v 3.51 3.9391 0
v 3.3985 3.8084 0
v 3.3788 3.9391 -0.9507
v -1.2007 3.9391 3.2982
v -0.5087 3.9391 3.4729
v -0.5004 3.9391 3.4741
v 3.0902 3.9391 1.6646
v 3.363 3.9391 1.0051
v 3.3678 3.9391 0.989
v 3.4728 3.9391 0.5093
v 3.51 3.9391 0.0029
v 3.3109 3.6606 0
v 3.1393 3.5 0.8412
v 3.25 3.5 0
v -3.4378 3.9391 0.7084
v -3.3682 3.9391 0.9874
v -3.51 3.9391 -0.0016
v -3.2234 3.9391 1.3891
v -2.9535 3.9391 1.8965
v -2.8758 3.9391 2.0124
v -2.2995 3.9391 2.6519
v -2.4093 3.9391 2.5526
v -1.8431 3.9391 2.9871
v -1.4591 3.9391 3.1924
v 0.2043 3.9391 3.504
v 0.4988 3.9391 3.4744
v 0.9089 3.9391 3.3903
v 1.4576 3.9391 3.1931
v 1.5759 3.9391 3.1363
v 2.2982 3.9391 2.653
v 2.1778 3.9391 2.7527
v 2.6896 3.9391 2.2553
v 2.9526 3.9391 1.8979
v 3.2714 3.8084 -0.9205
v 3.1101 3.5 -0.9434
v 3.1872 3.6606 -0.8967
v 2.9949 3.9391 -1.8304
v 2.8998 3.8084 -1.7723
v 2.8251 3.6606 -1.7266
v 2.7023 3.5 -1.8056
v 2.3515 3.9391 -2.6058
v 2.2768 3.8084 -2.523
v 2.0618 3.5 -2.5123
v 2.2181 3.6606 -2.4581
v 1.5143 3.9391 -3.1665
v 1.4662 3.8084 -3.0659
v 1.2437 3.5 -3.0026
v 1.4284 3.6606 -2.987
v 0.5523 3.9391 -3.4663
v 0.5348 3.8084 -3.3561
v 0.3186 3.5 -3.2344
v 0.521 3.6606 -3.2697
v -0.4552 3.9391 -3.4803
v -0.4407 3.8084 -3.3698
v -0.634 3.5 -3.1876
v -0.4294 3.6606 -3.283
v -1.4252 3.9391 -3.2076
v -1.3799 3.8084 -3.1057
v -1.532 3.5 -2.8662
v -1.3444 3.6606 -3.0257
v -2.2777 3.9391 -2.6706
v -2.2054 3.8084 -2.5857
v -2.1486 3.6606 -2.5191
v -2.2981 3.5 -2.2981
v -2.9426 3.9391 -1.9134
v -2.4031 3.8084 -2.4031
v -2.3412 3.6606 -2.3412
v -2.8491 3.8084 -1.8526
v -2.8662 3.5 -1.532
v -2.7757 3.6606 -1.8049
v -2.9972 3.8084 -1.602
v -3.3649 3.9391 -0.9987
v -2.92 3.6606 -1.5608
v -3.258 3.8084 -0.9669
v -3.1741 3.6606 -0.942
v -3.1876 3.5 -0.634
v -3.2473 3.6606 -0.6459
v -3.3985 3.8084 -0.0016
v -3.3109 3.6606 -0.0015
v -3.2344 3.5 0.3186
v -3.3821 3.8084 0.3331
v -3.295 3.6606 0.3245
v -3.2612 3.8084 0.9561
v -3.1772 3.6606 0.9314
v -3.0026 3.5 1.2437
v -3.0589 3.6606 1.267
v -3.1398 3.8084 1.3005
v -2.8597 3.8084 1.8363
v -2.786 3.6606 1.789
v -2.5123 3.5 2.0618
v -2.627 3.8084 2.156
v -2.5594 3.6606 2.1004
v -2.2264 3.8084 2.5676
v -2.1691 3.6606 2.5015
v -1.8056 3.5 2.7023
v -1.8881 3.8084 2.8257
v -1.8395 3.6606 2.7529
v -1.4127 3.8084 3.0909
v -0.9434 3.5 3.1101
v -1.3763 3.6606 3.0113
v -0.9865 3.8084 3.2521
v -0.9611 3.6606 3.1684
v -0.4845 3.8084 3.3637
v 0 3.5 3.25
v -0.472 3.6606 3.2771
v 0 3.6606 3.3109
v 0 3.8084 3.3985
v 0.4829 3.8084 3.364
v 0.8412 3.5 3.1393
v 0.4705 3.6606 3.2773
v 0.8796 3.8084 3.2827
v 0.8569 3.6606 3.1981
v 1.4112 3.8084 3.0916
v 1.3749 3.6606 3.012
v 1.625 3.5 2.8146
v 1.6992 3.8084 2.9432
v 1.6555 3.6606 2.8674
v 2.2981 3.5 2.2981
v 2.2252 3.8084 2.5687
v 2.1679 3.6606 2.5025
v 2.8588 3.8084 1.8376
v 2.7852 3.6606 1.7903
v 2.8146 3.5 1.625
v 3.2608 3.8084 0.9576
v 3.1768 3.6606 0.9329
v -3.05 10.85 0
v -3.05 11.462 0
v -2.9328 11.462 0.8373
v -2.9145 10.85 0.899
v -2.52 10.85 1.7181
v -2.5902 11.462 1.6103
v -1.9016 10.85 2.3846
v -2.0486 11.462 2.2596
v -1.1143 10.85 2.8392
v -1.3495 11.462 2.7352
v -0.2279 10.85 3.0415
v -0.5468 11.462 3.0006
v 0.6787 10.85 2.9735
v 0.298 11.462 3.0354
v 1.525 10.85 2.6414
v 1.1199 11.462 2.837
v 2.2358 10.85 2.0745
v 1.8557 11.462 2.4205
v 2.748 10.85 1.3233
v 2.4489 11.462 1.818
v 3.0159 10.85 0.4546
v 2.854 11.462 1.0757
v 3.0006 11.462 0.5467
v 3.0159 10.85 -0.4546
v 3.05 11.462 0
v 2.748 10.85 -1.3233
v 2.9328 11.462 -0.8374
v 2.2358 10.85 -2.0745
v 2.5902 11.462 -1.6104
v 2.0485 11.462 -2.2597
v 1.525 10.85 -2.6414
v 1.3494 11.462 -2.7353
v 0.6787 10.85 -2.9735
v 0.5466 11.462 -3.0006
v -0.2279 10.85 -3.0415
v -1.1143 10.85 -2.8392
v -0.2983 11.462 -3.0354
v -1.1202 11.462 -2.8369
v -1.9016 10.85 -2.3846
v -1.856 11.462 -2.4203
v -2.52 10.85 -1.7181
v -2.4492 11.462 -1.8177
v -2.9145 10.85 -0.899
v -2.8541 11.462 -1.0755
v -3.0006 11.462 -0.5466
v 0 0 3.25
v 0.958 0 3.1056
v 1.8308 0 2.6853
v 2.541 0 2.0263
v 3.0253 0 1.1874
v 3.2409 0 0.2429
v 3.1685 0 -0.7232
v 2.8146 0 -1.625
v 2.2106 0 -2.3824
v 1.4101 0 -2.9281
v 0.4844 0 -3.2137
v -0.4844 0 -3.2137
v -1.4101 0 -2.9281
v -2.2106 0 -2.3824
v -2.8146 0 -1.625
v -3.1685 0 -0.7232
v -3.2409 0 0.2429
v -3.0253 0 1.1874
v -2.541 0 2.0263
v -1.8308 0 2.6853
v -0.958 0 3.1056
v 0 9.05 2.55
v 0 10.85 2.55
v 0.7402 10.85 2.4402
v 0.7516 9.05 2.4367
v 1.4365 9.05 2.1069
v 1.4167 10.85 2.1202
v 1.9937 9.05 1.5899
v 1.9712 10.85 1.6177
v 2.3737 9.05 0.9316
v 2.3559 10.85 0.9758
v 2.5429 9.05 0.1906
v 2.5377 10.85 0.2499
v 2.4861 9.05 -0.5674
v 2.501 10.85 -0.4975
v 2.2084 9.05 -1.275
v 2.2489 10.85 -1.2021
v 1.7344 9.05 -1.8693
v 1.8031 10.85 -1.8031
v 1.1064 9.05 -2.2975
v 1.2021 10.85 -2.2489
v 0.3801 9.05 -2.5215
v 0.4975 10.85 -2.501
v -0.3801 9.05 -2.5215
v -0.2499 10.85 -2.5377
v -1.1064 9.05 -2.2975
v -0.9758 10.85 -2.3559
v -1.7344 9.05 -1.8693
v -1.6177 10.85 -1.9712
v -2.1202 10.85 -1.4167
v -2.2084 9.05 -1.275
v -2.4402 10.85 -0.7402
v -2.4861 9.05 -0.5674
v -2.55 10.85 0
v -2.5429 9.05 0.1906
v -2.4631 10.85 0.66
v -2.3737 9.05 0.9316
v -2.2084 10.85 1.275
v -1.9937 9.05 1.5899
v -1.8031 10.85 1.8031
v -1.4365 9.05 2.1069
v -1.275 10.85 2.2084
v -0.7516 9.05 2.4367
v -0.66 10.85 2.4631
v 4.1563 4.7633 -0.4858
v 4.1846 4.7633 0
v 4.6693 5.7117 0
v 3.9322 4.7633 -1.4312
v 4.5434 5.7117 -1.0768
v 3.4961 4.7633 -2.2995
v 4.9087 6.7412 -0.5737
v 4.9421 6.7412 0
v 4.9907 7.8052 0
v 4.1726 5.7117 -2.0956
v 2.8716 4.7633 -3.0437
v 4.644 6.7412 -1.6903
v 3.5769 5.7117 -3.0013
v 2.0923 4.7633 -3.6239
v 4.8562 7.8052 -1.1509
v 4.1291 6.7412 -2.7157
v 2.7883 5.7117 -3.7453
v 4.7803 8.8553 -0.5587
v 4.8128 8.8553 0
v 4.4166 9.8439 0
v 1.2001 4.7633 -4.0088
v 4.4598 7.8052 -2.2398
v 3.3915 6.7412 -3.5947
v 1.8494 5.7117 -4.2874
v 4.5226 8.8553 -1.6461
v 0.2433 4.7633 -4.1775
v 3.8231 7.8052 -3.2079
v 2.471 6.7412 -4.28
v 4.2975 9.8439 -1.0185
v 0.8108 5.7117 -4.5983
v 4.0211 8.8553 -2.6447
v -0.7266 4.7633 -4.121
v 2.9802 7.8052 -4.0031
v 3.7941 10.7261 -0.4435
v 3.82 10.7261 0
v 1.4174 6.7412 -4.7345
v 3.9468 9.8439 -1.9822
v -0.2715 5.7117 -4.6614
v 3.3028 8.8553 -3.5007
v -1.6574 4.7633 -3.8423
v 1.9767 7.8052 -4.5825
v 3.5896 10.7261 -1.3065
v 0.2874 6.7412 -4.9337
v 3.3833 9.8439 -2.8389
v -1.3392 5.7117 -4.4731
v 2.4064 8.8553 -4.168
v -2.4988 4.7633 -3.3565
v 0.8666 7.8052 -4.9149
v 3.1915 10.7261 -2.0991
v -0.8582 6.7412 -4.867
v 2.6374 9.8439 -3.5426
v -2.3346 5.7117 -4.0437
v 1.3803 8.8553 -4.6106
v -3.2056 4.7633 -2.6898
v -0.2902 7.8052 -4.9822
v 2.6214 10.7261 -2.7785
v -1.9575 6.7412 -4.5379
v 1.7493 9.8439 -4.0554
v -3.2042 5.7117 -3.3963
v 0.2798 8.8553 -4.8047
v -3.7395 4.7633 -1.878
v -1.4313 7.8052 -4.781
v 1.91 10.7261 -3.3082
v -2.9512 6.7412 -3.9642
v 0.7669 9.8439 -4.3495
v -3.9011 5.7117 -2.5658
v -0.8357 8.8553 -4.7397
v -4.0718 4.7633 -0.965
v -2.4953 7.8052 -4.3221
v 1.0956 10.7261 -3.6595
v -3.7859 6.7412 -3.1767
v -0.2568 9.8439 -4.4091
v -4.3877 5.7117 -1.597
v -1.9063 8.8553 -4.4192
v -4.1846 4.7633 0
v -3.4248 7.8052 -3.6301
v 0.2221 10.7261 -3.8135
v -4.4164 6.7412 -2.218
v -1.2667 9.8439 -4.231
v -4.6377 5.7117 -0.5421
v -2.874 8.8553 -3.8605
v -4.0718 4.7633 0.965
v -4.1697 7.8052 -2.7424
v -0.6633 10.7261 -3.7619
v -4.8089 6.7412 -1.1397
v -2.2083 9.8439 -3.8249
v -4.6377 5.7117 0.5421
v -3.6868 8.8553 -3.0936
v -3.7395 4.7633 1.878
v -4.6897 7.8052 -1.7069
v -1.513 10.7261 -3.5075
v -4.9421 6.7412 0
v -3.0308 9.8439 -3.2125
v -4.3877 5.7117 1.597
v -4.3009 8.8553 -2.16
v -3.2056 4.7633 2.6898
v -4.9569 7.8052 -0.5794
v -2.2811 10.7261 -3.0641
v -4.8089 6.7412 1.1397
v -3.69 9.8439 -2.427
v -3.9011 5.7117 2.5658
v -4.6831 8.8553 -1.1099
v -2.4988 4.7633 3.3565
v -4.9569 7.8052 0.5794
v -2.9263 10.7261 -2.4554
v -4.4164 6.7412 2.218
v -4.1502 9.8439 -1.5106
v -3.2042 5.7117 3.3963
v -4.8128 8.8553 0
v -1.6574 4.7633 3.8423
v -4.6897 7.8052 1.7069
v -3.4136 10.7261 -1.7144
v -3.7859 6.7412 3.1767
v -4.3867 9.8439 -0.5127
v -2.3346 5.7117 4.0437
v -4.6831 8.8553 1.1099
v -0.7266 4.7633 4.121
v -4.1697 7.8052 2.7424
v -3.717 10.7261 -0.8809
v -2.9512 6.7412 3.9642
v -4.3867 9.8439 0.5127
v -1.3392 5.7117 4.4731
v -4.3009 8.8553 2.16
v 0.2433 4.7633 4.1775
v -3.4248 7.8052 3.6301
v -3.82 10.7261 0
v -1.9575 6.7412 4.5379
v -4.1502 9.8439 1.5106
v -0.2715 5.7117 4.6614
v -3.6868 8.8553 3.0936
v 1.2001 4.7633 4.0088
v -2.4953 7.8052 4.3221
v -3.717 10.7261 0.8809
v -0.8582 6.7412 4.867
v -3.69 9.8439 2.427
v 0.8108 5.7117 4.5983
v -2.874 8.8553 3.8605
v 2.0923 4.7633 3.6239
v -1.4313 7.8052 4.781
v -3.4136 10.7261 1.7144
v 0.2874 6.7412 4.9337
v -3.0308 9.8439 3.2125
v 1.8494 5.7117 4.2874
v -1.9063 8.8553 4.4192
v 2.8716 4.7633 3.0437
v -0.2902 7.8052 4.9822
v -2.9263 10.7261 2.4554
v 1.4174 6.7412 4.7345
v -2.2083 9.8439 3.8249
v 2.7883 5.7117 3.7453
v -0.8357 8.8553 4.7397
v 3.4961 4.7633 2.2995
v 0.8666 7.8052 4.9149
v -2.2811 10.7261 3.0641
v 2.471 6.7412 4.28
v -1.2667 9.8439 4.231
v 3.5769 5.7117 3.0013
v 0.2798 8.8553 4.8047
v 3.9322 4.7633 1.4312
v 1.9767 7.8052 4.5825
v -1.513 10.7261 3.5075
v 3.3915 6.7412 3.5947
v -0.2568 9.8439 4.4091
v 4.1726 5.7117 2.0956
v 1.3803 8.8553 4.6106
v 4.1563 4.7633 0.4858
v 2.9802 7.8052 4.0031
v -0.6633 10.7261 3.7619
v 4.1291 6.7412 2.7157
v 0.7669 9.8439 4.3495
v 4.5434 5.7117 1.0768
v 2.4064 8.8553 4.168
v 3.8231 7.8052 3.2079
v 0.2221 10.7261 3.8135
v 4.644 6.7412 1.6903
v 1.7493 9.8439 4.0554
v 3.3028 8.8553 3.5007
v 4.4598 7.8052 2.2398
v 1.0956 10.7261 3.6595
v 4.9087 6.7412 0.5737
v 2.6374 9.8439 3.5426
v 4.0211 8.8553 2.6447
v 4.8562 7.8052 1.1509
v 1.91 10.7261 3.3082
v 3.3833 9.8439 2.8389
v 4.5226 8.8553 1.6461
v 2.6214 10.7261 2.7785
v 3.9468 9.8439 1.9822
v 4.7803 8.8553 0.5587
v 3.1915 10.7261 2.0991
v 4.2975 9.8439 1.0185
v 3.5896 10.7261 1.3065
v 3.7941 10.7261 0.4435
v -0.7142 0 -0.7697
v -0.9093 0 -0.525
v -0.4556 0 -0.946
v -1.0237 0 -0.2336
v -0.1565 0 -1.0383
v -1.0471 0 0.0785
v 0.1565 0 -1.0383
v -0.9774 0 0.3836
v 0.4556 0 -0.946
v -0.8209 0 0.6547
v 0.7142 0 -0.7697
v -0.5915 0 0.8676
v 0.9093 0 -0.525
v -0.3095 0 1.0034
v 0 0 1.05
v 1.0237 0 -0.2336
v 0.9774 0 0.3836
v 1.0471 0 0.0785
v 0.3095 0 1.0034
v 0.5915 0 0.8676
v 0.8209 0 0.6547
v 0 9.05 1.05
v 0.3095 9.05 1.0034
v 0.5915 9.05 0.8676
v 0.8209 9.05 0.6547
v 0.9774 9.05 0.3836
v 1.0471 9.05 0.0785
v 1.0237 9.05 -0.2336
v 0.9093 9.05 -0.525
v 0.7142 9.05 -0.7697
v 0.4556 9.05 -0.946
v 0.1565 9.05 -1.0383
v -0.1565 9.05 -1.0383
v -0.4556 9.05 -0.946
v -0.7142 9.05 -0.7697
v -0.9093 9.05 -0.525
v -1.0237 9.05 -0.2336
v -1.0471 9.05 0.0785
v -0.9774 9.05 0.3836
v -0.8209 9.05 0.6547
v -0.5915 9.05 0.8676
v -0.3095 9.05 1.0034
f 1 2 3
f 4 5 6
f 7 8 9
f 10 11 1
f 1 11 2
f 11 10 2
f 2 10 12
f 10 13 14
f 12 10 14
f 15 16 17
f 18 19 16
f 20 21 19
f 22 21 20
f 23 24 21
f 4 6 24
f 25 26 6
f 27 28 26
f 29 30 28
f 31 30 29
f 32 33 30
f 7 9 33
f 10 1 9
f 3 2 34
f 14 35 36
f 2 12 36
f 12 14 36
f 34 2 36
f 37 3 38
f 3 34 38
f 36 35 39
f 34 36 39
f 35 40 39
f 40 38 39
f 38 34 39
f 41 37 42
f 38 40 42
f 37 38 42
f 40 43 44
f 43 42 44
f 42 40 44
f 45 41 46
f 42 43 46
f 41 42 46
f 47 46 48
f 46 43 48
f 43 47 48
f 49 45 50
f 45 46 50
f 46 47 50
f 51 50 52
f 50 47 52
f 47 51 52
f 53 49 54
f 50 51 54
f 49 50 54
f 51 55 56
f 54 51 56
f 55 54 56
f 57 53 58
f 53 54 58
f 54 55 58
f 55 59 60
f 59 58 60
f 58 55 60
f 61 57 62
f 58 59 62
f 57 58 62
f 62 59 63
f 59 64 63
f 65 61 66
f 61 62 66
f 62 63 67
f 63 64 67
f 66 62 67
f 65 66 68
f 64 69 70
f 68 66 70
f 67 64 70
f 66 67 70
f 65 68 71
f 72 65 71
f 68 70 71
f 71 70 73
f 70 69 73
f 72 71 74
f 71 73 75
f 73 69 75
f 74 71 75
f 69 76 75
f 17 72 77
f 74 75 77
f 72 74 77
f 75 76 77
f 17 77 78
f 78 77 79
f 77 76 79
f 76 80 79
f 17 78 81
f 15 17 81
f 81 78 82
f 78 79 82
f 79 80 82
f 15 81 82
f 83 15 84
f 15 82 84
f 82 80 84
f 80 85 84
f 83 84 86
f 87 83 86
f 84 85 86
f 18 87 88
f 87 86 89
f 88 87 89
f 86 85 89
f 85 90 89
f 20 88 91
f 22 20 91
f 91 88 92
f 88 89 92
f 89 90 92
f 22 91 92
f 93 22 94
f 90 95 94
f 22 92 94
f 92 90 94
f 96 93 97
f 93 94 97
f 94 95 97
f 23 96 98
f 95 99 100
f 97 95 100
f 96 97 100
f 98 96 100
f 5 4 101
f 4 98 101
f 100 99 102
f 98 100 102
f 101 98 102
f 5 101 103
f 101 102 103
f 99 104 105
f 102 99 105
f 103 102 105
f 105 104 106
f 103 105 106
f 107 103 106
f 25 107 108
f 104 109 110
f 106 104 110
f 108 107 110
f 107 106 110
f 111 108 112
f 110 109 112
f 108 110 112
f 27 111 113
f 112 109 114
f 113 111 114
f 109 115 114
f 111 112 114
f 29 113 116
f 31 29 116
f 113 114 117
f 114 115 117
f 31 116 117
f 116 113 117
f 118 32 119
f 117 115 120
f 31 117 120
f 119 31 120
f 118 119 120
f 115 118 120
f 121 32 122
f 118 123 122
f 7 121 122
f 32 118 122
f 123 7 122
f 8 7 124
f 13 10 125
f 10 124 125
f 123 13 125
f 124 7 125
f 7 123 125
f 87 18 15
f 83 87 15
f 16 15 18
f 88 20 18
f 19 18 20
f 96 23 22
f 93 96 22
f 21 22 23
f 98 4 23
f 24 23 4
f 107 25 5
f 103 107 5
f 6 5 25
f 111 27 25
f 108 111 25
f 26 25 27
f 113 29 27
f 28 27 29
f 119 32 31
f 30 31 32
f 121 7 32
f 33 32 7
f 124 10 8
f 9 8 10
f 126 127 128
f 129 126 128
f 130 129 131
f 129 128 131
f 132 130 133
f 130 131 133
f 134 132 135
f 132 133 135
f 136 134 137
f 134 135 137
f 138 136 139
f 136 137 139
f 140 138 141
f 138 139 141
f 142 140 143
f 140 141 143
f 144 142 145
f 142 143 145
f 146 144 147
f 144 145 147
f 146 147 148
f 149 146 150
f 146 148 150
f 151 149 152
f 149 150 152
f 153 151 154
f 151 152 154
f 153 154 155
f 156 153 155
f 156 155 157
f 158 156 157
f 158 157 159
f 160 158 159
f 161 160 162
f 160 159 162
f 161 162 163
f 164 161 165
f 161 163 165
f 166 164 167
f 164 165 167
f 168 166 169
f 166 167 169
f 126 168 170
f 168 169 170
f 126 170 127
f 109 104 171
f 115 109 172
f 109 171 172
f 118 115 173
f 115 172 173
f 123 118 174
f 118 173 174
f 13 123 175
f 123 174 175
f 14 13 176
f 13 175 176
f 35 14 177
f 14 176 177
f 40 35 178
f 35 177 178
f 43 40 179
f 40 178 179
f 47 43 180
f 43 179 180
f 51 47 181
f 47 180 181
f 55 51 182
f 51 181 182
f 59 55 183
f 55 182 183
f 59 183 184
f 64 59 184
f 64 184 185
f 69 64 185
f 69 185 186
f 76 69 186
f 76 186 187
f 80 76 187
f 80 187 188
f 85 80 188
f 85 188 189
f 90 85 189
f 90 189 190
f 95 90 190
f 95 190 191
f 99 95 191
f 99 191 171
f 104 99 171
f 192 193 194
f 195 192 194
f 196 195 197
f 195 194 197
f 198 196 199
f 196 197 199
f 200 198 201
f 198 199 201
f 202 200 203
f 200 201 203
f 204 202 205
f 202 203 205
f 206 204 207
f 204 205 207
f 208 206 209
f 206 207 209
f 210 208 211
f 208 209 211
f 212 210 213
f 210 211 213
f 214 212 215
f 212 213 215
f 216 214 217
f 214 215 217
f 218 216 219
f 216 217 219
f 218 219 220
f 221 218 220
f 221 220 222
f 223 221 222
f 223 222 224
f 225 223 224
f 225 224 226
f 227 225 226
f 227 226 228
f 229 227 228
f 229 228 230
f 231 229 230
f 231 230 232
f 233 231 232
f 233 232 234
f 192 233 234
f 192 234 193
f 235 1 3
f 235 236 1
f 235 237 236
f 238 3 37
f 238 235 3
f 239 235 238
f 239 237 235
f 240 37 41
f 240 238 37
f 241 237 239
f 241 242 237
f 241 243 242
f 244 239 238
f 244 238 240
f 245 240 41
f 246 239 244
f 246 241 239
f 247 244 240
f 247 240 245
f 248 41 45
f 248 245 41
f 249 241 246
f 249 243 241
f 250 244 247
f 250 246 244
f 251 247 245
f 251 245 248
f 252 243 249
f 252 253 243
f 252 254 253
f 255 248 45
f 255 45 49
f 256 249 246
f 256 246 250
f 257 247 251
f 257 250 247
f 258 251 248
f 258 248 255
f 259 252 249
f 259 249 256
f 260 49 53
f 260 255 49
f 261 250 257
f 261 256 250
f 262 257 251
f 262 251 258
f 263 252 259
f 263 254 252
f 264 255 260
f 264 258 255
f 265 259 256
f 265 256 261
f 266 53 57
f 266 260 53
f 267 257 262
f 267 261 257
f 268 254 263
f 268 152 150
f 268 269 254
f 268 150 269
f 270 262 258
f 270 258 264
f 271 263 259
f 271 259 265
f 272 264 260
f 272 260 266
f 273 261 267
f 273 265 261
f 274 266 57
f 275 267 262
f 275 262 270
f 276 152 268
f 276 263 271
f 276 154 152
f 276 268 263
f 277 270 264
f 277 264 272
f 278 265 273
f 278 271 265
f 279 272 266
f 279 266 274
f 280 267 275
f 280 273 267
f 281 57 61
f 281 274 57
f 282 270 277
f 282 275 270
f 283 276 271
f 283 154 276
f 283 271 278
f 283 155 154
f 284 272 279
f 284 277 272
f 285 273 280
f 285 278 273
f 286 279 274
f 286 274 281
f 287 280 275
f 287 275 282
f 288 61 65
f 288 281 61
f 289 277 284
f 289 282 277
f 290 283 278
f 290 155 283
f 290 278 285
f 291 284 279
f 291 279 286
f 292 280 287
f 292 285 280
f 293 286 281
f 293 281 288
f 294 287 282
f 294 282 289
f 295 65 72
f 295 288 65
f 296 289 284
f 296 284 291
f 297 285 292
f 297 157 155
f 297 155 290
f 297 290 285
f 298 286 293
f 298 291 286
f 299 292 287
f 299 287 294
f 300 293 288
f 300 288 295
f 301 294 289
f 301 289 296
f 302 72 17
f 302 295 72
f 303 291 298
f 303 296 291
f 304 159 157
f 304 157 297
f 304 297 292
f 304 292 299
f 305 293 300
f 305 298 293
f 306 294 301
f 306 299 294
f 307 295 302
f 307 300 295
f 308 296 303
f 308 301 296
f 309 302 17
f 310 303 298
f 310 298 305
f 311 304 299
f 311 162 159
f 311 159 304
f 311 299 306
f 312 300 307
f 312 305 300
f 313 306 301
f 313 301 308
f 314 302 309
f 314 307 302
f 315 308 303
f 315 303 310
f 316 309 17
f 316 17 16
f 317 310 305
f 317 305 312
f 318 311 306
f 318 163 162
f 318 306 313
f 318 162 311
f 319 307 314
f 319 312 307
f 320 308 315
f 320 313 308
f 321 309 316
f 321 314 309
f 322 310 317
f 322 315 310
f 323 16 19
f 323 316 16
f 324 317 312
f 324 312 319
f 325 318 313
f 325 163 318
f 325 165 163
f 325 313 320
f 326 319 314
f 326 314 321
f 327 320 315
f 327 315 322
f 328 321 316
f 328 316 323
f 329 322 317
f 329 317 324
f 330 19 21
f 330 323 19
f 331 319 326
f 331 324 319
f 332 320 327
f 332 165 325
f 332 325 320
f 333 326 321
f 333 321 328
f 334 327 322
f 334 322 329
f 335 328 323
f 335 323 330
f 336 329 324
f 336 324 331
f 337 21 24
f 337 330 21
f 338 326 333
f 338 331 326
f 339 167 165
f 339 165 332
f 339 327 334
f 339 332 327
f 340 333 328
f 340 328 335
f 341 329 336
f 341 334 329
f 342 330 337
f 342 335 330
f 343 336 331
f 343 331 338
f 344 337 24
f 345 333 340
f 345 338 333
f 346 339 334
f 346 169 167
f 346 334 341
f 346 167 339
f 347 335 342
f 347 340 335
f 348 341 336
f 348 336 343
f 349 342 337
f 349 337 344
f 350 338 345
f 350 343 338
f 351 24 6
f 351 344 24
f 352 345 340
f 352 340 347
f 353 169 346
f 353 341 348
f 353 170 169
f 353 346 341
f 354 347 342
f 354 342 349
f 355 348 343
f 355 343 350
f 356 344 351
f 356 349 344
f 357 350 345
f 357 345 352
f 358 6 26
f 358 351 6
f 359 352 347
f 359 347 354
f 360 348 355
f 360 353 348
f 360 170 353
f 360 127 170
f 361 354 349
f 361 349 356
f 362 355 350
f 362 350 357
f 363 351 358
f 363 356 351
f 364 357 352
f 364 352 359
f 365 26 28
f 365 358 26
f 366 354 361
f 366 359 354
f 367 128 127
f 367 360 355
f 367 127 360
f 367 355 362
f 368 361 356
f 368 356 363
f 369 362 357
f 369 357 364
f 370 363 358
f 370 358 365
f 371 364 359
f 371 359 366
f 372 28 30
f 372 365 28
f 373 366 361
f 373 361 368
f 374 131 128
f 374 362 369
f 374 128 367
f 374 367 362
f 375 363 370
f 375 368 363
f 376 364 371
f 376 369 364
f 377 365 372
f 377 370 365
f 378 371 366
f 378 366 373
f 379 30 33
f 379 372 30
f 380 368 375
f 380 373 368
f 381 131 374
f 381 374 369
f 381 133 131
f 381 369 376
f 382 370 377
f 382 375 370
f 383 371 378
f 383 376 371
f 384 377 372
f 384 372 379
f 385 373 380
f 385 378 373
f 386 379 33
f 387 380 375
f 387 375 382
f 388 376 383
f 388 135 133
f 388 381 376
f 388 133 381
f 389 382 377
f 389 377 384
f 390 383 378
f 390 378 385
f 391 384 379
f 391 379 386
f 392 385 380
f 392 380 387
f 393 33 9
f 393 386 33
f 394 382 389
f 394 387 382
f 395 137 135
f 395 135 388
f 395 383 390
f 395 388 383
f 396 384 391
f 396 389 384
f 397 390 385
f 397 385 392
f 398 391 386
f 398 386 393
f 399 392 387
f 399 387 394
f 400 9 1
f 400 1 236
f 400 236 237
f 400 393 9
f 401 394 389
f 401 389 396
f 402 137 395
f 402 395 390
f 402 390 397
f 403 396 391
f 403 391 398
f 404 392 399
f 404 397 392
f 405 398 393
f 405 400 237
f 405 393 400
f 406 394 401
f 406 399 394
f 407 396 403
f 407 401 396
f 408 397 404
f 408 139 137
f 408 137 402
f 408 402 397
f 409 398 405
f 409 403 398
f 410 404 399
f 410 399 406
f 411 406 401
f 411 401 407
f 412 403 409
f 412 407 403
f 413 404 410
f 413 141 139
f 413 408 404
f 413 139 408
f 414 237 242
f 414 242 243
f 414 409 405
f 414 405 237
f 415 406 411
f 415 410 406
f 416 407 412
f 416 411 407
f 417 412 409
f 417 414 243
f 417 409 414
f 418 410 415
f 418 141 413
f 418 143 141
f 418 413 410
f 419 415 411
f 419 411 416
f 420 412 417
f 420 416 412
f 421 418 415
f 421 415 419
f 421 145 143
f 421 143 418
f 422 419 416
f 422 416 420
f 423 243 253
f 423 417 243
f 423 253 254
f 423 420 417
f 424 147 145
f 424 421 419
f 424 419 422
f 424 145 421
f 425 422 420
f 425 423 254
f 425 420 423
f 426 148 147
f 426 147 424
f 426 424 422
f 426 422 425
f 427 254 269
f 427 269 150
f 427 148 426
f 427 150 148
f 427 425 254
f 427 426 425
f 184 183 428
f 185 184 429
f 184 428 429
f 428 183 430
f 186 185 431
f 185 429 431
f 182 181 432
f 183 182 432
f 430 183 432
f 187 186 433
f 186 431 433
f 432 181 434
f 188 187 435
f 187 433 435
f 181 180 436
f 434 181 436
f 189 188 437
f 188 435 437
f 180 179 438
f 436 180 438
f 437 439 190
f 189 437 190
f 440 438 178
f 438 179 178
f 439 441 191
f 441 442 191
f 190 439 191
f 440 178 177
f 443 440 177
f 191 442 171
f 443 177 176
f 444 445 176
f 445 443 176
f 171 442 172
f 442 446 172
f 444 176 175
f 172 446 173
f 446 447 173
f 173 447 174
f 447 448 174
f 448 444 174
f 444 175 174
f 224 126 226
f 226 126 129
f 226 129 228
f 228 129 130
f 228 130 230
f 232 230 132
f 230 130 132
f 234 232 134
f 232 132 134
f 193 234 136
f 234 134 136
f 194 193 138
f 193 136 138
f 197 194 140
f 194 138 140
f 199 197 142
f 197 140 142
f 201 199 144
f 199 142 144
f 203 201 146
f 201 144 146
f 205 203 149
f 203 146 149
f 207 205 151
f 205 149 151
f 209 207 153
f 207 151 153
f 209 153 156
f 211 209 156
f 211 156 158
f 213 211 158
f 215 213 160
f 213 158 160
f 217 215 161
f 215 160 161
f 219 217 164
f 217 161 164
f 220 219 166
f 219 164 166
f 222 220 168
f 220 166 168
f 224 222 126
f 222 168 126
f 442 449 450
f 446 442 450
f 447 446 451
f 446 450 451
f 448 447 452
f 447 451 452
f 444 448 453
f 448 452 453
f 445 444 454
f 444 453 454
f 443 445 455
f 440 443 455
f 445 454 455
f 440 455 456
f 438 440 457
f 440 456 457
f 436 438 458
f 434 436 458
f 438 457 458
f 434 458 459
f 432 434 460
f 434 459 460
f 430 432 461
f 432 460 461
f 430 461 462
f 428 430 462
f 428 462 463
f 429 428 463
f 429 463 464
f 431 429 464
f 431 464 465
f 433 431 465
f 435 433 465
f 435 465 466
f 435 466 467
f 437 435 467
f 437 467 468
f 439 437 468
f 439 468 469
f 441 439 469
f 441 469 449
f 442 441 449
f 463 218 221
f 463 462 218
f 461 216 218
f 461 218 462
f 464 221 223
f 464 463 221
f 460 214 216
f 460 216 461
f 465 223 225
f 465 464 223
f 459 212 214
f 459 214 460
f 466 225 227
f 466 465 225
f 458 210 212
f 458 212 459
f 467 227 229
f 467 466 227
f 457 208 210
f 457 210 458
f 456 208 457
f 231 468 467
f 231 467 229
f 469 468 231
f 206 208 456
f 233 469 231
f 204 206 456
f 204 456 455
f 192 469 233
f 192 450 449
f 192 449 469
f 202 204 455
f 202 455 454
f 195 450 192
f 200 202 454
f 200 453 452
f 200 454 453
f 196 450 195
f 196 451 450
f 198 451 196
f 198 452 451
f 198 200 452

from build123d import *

# Parameters (mm, degrees)
SKETCH1_R           = 3.2500000000000004
BOSS_EXTRUDE1_DEPTH = 3.5
SKETCH5_W           = 3.0499999999999994
SKETCH5_H           = 2.603568585765487
SKETCH7_R           = 2.5500000000000003
CUT_EXTRUDE1_DEPTH  = 1.8
SKETCH8_R           = 1.05
CUT_EXTRUDE2_DEPTH  = 12.484881366397794
FILLET1_R           = 1


with BuildPart() as part:
    # Sketch1 → Boss-Extrude1 (new body)
    with BuildSketch(Plane(origin=(0, 0, 0), x_dir=(1, 0, 0), z_dir=(0, 1, 0))):
        with Locations(Location((0, 0, 0), (0, 0, 270))):
            Circle(SKETCH1_R)
    extrude(amount=BOSS_EXTRUDE1_DEPTH)

    # Sweep2: read off the stored shape, not the designer's step
    # Sweep2 outline → Sweep2 (revolve)
    with BuildSketch(Plane.XY):
        with BuildLine():
            Line((0, 12.5), (0, 3.499999997))
            Line((0, 3.499999997), (2.999999996, 3.499999997))
            ThreePointArc((2.999999996, 3.499999997), (4.743416491, 9.081138828), (0, 12.5))
        make_face()
    revolve(axis=Axis((0, 0, 0), (0, 1, 0)))

    # Cut-Sweep2: sweep along a curve in space
    with BuildLine() as cut_sweep2_path:
        ThreePointArc((0, 3.4999999999999996, 3.000000000000002), (2.121320343559644, 3.4999999999999996, 2.121320343559644), (3.000000000000002, 3.4999999999999996, 0))
        ThreePointArc((3.000000000000002, 3.4999999999999996, 0), (2.121320343559644, 3.4999999999999996, -2.121320343559644), (0, 3.4999999999999996, -3.000000000000002))
        ThreePointArc((0, 3.4999999999999996, -3.000000000000002), (-2.121320343559644, 3.4999999999999996, -2.121320343559644), (-3.000000000000002, 3.4999999999999996, 0))
        ThreePointArc((-3.000000000000002, 3.4999999999999996, 0), (-2.121320343559644, 3.4999999999999996, 2.121320343559644), (0, 3.4999999999999996, 3.000000000000002))
    # Sketch5 → Cut-Sweep2 (sweep, cut)
    with BuildSketch(Plane.XY):
        with Locations((1.5249999999999997, 12.151784292882743)):
            Rectangle(SKETCH5_W, SKETCH5_H)
    sweep(path=cut_sweep2_path.line, mode=Mode.SUBTRACT)

    # Sketch7 → Cut-Extrude1 (cut)
    with BuildSketch(Plane(origin=(0, 10.85, 0), x_dir=(1, 0, 0), z_dir=(0, 1, 0))):
        with Locations(Location((0, 0, 0), (0, 0, 270))):
            Circle(SKETCH7_R)
    extrude(amount=-CUT_EXTRUDE1_DEPTH, mode=Mode.SUBTRACT)

    # Sketch8 → Cut-Extrude2 (cut, through all)
    with BuildSketch(Plane(origin=(0, 9.05, 0), x_dir=(1, 0, 0), z_dir=(0, 1, 0))):
        with Locations(Location((0, 0, 0), (0, 0, 270))):
            Circle(SKETCH8_R)
    extrude(amount=-CUT_EXTRUDE2_DEPTH, mode=Mode.SUBTRACT)

    # Fillet1
    # the kernel refuses this fillet: 1 mm, written as the material it adds along each edge
    with BuildSketch(Plane(origin=(0, 3.4999999970000006, 0), x_dir=(1, 0, 0), z_dir=(0, 0, 1))) as fillet1_piece_1:
        with BuildLine():
            CenterArc((4.21199518408407, -0.27306640979926655), FILLET1_R, 134.58762076250994, 29.565561163496568)
            ThreePointArc((3.5099959867224584, 0.4391113256738759), (3.2623943067411867, 0.21096537839129237), (2.9999999959999997, 0))
            Line((2.9999999959999997, 0), (3.250000000000001, 2.99999936e-09))
        make_face()
    revolve(axis=Axis((0, 3.4999999970000006, 0), (0, 1, 0)))


solid = part.part
